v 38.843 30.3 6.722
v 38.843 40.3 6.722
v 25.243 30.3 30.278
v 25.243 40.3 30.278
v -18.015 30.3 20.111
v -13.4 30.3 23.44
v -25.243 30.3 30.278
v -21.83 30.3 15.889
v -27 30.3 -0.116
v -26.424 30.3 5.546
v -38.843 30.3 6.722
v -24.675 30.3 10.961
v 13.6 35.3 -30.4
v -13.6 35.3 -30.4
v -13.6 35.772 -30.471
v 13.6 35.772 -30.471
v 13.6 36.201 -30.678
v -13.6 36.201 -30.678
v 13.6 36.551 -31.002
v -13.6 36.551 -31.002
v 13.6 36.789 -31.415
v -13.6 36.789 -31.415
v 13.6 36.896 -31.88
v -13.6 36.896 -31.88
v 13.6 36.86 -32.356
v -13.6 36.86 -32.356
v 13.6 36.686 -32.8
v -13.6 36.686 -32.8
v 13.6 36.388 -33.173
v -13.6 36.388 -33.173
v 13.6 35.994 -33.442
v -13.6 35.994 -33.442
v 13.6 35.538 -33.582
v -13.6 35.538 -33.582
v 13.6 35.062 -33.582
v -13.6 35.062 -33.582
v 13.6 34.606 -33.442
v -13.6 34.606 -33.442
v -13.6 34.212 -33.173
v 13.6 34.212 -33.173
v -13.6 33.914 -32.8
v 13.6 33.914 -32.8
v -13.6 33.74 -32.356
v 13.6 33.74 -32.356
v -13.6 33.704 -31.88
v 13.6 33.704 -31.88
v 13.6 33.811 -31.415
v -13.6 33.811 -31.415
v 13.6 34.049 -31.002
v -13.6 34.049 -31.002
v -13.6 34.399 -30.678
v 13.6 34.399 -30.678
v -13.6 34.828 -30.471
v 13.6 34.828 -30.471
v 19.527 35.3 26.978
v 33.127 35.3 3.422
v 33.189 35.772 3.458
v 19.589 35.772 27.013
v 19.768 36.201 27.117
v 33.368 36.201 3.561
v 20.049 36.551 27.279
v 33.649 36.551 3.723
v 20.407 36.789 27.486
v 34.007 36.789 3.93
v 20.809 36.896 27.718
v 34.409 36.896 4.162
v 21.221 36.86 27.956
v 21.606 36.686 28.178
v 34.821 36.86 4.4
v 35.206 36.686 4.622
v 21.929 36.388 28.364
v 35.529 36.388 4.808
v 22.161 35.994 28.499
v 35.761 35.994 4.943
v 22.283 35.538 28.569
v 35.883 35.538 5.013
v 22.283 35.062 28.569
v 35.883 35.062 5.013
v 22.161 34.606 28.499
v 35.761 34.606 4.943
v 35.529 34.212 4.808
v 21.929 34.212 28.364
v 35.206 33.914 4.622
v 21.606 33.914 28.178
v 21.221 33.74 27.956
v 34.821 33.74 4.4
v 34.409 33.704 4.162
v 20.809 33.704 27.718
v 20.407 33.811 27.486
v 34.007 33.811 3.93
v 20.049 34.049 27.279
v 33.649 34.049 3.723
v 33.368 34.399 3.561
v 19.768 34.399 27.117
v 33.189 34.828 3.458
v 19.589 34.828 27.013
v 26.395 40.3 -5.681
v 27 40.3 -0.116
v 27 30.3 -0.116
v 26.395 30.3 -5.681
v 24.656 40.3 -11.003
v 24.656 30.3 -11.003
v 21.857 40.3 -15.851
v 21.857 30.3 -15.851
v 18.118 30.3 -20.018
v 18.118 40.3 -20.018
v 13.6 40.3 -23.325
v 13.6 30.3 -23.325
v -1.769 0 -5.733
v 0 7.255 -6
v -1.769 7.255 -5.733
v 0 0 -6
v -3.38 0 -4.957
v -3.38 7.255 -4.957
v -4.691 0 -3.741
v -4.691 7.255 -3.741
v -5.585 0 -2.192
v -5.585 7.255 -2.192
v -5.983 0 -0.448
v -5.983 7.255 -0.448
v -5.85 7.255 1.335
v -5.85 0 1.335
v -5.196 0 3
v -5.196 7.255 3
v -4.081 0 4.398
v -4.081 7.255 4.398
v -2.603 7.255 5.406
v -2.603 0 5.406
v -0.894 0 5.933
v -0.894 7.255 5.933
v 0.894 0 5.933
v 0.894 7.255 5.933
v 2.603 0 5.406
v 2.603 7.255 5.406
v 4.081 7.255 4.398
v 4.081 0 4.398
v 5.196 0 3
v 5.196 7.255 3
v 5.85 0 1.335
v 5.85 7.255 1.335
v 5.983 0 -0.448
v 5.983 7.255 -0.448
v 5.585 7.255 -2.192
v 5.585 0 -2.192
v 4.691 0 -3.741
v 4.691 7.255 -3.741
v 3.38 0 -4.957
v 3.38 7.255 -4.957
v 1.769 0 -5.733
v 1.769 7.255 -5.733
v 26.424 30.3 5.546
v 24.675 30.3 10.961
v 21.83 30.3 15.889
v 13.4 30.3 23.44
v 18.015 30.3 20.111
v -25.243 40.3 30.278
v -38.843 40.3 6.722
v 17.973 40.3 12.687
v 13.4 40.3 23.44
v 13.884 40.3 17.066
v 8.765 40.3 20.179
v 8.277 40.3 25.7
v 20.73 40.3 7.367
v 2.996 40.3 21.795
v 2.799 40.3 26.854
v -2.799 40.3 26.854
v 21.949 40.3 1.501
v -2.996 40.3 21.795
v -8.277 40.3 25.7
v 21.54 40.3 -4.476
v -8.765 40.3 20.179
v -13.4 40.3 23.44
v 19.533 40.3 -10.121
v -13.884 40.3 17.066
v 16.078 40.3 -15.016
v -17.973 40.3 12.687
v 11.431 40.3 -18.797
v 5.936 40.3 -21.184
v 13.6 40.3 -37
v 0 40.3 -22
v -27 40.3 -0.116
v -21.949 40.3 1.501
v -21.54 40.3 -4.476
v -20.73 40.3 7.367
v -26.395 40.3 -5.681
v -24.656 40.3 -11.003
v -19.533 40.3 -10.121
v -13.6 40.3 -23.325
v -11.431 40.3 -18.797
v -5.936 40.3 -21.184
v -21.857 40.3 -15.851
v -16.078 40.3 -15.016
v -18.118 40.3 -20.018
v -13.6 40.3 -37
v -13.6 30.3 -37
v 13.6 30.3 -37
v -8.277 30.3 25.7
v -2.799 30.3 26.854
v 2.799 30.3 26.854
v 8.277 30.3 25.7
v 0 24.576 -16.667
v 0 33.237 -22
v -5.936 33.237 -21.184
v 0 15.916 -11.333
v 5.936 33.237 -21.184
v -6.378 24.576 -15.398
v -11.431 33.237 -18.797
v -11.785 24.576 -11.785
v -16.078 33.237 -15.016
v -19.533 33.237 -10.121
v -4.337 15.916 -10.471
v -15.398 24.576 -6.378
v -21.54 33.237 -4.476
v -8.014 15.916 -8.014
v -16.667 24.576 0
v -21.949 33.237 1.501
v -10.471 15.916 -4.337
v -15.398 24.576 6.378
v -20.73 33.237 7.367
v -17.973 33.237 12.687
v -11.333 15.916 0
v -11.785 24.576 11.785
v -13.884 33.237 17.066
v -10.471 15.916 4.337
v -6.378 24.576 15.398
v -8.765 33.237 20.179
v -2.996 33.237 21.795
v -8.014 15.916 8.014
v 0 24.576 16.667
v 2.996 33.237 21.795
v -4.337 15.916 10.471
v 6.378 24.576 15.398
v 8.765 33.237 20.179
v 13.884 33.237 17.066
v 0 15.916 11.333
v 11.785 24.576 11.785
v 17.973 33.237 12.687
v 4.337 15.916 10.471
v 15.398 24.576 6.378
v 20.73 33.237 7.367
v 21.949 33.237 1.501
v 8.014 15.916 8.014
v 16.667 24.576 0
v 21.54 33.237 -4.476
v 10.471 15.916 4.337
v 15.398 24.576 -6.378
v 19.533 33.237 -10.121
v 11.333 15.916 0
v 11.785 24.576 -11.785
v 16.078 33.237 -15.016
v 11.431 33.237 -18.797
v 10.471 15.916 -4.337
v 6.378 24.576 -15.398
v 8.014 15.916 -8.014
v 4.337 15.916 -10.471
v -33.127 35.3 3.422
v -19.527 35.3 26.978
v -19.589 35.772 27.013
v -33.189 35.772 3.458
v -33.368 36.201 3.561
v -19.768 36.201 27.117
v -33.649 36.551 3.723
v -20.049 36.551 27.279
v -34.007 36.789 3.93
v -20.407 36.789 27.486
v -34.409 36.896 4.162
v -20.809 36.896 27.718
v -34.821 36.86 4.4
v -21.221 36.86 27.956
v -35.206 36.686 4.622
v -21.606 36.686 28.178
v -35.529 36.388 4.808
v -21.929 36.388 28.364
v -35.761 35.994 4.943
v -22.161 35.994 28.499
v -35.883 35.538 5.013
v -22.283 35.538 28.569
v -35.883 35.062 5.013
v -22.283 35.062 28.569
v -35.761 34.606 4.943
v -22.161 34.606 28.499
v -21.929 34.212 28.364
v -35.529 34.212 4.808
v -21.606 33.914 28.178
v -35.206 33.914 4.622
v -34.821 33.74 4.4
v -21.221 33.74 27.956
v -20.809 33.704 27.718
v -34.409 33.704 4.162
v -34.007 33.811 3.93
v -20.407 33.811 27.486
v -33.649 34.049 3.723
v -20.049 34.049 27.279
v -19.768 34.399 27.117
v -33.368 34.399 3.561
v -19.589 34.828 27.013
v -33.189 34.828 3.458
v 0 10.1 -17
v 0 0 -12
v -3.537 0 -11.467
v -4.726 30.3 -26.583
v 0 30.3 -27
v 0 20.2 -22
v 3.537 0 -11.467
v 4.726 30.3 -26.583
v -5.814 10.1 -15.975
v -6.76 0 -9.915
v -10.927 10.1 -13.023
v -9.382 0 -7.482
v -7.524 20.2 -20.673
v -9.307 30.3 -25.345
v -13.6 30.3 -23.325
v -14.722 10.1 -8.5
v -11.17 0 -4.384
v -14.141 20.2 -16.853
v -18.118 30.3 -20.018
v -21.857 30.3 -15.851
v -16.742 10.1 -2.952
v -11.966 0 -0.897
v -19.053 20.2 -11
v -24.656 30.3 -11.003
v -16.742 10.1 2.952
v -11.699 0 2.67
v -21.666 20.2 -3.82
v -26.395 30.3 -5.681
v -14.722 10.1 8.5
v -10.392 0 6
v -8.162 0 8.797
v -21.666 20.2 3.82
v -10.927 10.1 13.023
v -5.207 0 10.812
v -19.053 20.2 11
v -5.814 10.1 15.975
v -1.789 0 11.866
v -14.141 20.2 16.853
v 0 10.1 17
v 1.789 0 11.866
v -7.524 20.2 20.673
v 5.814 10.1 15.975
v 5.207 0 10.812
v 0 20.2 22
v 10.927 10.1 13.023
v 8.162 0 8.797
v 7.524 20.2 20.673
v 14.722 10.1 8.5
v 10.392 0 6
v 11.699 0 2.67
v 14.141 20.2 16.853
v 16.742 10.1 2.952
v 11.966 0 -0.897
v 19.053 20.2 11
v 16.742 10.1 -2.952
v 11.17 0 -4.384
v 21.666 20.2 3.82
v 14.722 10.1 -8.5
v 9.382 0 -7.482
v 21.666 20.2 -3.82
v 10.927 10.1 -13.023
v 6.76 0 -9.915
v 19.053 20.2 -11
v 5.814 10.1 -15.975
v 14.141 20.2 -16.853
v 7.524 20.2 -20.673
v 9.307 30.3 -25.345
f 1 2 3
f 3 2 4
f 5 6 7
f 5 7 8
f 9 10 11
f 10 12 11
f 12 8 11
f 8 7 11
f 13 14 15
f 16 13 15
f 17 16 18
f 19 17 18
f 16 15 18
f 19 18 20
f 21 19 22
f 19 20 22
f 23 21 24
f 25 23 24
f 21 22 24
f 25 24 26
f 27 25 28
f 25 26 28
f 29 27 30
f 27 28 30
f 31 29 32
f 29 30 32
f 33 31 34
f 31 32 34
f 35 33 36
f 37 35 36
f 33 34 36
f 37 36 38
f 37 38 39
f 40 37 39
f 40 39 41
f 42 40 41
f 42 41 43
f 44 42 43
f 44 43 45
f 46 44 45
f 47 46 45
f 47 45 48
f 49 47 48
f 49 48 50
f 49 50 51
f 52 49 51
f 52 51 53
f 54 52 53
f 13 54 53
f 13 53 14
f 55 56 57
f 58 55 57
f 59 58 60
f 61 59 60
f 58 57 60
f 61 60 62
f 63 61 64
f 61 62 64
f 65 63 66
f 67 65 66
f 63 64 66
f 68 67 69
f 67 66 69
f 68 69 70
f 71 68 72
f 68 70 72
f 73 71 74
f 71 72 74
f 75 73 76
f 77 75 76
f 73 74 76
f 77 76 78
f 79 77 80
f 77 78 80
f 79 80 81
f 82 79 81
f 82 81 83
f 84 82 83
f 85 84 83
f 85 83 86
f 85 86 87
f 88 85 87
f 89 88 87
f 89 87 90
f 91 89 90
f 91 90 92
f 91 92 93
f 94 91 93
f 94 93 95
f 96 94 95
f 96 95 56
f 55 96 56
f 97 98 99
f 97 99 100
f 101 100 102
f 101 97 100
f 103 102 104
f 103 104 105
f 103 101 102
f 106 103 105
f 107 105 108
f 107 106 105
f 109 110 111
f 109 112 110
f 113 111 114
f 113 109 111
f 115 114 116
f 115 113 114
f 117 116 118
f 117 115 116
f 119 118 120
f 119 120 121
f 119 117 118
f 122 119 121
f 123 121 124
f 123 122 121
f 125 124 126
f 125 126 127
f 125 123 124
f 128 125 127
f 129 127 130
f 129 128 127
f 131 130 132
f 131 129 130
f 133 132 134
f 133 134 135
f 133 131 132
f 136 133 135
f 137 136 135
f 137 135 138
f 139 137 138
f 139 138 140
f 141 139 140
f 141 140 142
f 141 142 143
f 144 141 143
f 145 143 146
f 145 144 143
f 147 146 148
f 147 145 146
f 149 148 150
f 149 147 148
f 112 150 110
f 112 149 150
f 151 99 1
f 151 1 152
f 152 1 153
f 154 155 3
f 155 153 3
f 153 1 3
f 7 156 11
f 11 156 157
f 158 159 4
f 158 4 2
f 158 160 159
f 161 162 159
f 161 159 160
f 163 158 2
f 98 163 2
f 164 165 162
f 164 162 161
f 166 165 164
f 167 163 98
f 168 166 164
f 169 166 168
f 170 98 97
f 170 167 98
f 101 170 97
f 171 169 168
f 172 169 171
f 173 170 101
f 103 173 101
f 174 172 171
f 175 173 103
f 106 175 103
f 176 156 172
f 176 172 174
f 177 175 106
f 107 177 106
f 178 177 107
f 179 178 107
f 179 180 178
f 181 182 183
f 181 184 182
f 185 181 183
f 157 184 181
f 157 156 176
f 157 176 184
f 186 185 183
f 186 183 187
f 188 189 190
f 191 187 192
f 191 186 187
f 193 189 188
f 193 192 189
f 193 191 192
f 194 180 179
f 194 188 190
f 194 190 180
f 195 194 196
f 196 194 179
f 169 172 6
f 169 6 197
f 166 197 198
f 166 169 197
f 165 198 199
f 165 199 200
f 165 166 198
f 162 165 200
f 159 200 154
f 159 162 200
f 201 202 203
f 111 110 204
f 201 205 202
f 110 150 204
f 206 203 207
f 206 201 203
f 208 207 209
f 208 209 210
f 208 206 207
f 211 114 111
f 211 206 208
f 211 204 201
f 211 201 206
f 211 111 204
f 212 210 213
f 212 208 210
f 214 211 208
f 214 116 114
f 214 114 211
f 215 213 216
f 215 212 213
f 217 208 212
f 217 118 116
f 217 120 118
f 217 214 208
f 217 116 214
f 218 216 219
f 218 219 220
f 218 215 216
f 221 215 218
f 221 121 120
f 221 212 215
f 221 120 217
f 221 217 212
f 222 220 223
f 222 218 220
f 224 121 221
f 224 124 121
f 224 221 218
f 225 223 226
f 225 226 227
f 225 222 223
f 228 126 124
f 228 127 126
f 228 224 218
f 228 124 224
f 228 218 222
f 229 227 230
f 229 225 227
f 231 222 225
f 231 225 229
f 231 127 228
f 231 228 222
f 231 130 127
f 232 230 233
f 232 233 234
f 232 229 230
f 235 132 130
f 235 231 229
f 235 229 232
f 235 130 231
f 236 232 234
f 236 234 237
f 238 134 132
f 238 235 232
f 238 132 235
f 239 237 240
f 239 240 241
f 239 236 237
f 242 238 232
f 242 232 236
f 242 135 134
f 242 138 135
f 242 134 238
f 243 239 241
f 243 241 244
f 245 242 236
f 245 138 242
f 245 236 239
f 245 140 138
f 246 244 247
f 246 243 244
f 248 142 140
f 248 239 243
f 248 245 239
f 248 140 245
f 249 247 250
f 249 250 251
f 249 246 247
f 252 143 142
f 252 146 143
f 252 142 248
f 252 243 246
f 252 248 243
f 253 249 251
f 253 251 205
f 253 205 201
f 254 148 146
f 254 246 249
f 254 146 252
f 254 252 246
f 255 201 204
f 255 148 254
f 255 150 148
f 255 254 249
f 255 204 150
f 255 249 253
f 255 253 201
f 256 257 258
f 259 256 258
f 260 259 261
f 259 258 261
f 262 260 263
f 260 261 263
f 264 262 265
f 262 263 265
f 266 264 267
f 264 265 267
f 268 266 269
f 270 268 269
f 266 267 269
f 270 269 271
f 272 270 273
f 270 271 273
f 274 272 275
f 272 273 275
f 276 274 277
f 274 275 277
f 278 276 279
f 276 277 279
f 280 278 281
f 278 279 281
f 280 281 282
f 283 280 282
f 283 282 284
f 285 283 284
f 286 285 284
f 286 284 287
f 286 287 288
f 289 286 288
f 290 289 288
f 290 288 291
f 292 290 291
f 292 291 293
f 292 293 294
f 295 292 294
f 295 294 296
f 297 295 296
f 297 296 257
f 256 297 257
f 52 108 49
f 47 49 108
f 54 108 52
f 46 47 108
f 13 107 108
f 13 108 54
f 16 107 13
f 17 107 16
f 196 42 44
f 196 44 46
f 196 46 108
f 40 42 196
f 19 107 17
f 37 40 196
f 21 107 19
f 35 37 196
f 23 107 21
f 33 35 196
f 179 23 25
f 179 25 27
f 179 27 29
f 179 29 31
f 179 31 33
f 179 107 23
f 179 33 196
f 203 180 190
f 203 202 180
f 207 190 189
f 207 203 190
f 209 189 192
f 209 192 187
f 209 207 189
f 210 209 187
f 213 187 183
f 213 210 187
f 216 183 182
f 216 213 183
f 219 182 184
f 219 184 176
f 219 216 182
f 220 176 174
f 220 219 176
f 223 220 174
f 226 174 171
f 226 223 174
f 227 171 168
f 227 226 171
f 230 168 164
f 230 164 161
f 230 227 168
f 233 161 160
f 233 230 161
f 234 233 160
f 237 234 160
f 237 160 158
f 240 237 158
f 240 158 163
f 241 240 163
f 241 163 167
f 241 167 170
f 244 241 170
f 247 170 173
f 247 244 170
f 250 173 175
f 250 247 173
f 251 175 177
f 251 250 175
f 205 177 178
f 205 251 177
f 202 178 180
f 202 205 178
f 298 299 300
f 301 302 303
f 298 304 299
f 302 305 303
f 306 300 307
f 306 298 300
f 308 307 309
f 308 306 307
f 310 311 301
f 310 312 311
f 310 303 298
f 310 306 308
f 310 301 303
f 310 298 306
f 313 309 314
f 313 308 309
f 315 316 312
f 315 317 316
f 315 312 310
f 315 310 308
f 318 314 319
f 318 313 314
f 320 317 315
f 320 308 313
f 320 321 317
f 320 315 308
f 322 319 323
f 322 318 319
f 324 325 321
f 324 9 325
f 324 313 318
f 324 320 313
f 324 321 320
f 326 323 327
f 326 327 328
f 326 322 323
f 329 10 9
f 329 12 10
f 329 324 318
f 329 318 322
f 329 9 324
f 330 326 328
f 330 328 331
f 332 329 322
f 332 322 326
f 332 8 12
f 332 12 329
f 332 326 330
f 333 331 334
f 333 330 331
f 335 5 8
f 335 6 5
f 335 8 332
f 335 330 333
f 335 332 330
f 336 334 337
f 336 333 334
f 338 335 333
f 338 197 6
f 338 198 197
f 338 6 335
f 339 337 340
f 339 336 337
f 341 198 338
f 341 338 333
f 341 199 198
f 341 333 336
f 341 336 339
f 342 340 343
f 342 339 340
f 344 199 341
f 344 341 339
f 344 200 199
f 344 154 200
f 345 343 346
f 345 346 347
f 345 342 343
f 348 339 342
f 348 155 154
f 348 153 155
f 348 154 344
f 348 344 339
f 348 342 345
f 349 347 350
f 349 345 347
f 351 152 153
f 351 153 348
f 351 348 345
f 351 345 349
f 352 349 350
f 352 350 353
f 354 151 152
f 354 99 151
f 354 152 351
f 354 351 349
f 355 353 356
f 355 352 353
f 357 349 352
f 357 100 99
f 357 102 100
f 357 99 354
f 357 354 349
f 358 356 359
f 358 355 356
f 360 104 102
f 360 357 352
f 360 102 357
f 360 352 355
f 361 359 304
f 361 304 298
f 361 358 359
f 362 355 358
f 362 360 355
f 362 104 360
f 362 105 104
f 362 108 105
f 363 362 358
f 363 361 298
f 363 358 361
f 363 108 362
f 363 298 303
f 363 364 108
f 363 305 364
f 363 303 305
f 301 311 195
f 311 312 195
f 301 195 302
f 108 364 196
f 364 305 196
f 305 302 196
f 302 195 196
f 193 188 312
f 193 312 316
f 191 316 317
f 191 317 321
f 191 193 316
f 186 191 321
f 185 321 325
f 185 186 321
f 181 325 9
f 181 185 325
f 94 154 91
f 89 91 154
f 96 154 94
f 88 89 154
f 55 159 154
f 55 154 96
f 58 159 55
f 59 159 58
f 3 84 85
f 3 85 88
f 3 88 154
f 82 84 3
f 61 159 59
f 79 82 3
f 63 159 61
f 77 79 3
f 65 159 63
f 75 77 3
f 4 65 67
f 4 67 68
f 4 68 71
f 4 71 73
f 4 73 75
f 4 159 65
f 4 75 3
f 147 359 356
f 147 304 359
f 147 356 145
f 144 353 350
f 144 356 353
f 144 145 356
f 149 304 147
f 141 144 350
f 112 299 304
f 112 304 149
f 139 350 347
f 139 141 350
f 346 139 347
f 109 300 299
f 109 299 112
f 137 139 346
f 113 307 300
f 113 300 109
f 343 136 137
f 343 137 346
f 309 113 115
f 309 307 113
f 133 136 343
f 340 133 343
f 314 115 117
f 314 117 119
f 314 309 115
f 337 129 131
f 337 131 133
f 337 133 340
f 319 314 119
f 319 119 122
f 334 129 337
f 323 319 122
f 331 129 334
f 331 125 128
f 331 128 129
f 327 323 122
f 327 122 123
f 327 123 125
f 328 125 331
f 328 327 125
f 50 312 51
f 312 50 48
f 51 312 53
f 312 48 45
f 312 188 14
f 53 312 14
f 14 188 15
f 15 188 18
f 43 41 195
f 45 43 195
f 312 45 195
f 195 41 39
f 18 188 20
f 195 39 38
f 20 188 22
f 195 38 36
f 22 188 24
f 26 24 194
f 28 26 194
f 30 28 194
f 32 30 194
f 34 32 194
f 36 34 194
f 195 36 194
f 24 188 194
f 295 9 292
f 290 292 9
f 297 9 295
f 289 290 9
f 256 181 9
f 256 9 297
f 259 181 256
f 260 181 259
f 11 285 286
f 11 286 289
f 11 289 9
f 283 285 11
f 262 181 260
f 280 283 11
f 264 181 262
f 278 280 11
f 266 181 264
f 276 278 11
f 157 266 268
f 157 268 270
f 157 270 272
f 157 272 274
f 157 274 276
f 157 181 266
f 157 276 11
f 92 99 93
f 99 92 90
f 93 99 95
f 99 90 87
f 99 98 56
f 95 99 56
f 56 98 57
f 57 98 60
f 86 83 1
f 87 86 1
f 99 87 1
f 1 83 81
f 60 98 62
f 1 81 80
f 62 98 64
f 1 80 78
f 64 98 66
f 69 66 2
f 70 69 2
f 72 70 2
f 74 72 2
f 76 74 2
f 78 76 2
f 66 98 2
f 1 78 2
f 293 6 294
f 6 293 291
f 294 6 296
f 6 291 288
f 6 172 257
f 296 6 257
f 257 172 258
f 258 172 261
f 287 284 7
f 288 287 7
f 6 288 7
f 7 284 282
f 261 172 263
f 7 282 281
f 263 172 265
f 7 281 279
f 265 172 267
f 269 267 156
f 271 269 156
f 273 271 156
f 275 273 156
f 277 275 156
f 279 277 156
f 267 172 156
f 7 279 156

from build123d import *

# Parameters (mm, degrees)
ESQUISSE2_W                  = 27.2
ESQUISSE2_H                  = 14.017263762
BOSS_EXTRU_1_DEPTH           = 10
ESQUISSE3_R                  = 1.6
ENL_V_MAT_EXTRU_1_DEPTH      = 69.128187999
R_P_TITION_CIRCULAIRE1_COUNT = 3


with BuildPart() as part:
    # Esquisse1 → Révolution1 (revolve)
    with BuildSketch(Plane.XY):
        Polygon((-6, 0), (-12, 0), (-27, 30.3), (-27, 40.3), (-22, 40.3), (-22, 33.237189942), (-6, 7.254793936), align=None)
    revolve(axis=Axis((0, 0, 0), (0, 1, 0)))

    # Esquisse2 → Boss.-Extru.1 (add)
    with BuildSketch(Plane(origin=(0, 40.3, 0), x_dir=(1, 0, 0), z_dir=(0, 1, 0))):
        with Locations((0, 29.991368119)):
            Rectangle(ESQUISSE2_W, ESQUISSE2_H)
    boss_extru_1 = extrude(amount=-BOSS_EXTRU_1_DEPTH)

    # Esquisse3 → Enlèv. mat.-Extru.1 (cut, through all)
    with BuildSketch(Plane.ZY.offset(13.6)):
        with Locations((-32, 35.3)):
            Circle(ESQUISSE3_R)
    enl_v_mat_extru_1 = extrude(amount=-ENL_V_MAT_EXTRU_1_DEPTH, mode=Mode.SUBTRACT)

    # Répétition circulaire1: Boss.-Extru.1, Enlèv. mat.-Extru.1 ×3 about axis
    r_p_tition_circulaire1_axis = Axis((0, 30.3, 0), (0, -1, 0))
    add([boss_extru_1.rotate(r_p_tition_circulaire1_axis, i * 360 / R_P_TITION_CIRCULAIRE1_COUNT) for i in range(1, R_P_TITION_CIRCULAIRE1_COUNT)])
    add([enl_v_mat_extru_1.rotate(r_p_tition_circulaire1_axis, i * 360 / R_P_TITION_CIRCULAIRE1_COUNT) for i in range(1, R_P_TITION_CIRCULAIRE1_COUNT)], mode=Mode.SUBTRACT)


solid = part.part
